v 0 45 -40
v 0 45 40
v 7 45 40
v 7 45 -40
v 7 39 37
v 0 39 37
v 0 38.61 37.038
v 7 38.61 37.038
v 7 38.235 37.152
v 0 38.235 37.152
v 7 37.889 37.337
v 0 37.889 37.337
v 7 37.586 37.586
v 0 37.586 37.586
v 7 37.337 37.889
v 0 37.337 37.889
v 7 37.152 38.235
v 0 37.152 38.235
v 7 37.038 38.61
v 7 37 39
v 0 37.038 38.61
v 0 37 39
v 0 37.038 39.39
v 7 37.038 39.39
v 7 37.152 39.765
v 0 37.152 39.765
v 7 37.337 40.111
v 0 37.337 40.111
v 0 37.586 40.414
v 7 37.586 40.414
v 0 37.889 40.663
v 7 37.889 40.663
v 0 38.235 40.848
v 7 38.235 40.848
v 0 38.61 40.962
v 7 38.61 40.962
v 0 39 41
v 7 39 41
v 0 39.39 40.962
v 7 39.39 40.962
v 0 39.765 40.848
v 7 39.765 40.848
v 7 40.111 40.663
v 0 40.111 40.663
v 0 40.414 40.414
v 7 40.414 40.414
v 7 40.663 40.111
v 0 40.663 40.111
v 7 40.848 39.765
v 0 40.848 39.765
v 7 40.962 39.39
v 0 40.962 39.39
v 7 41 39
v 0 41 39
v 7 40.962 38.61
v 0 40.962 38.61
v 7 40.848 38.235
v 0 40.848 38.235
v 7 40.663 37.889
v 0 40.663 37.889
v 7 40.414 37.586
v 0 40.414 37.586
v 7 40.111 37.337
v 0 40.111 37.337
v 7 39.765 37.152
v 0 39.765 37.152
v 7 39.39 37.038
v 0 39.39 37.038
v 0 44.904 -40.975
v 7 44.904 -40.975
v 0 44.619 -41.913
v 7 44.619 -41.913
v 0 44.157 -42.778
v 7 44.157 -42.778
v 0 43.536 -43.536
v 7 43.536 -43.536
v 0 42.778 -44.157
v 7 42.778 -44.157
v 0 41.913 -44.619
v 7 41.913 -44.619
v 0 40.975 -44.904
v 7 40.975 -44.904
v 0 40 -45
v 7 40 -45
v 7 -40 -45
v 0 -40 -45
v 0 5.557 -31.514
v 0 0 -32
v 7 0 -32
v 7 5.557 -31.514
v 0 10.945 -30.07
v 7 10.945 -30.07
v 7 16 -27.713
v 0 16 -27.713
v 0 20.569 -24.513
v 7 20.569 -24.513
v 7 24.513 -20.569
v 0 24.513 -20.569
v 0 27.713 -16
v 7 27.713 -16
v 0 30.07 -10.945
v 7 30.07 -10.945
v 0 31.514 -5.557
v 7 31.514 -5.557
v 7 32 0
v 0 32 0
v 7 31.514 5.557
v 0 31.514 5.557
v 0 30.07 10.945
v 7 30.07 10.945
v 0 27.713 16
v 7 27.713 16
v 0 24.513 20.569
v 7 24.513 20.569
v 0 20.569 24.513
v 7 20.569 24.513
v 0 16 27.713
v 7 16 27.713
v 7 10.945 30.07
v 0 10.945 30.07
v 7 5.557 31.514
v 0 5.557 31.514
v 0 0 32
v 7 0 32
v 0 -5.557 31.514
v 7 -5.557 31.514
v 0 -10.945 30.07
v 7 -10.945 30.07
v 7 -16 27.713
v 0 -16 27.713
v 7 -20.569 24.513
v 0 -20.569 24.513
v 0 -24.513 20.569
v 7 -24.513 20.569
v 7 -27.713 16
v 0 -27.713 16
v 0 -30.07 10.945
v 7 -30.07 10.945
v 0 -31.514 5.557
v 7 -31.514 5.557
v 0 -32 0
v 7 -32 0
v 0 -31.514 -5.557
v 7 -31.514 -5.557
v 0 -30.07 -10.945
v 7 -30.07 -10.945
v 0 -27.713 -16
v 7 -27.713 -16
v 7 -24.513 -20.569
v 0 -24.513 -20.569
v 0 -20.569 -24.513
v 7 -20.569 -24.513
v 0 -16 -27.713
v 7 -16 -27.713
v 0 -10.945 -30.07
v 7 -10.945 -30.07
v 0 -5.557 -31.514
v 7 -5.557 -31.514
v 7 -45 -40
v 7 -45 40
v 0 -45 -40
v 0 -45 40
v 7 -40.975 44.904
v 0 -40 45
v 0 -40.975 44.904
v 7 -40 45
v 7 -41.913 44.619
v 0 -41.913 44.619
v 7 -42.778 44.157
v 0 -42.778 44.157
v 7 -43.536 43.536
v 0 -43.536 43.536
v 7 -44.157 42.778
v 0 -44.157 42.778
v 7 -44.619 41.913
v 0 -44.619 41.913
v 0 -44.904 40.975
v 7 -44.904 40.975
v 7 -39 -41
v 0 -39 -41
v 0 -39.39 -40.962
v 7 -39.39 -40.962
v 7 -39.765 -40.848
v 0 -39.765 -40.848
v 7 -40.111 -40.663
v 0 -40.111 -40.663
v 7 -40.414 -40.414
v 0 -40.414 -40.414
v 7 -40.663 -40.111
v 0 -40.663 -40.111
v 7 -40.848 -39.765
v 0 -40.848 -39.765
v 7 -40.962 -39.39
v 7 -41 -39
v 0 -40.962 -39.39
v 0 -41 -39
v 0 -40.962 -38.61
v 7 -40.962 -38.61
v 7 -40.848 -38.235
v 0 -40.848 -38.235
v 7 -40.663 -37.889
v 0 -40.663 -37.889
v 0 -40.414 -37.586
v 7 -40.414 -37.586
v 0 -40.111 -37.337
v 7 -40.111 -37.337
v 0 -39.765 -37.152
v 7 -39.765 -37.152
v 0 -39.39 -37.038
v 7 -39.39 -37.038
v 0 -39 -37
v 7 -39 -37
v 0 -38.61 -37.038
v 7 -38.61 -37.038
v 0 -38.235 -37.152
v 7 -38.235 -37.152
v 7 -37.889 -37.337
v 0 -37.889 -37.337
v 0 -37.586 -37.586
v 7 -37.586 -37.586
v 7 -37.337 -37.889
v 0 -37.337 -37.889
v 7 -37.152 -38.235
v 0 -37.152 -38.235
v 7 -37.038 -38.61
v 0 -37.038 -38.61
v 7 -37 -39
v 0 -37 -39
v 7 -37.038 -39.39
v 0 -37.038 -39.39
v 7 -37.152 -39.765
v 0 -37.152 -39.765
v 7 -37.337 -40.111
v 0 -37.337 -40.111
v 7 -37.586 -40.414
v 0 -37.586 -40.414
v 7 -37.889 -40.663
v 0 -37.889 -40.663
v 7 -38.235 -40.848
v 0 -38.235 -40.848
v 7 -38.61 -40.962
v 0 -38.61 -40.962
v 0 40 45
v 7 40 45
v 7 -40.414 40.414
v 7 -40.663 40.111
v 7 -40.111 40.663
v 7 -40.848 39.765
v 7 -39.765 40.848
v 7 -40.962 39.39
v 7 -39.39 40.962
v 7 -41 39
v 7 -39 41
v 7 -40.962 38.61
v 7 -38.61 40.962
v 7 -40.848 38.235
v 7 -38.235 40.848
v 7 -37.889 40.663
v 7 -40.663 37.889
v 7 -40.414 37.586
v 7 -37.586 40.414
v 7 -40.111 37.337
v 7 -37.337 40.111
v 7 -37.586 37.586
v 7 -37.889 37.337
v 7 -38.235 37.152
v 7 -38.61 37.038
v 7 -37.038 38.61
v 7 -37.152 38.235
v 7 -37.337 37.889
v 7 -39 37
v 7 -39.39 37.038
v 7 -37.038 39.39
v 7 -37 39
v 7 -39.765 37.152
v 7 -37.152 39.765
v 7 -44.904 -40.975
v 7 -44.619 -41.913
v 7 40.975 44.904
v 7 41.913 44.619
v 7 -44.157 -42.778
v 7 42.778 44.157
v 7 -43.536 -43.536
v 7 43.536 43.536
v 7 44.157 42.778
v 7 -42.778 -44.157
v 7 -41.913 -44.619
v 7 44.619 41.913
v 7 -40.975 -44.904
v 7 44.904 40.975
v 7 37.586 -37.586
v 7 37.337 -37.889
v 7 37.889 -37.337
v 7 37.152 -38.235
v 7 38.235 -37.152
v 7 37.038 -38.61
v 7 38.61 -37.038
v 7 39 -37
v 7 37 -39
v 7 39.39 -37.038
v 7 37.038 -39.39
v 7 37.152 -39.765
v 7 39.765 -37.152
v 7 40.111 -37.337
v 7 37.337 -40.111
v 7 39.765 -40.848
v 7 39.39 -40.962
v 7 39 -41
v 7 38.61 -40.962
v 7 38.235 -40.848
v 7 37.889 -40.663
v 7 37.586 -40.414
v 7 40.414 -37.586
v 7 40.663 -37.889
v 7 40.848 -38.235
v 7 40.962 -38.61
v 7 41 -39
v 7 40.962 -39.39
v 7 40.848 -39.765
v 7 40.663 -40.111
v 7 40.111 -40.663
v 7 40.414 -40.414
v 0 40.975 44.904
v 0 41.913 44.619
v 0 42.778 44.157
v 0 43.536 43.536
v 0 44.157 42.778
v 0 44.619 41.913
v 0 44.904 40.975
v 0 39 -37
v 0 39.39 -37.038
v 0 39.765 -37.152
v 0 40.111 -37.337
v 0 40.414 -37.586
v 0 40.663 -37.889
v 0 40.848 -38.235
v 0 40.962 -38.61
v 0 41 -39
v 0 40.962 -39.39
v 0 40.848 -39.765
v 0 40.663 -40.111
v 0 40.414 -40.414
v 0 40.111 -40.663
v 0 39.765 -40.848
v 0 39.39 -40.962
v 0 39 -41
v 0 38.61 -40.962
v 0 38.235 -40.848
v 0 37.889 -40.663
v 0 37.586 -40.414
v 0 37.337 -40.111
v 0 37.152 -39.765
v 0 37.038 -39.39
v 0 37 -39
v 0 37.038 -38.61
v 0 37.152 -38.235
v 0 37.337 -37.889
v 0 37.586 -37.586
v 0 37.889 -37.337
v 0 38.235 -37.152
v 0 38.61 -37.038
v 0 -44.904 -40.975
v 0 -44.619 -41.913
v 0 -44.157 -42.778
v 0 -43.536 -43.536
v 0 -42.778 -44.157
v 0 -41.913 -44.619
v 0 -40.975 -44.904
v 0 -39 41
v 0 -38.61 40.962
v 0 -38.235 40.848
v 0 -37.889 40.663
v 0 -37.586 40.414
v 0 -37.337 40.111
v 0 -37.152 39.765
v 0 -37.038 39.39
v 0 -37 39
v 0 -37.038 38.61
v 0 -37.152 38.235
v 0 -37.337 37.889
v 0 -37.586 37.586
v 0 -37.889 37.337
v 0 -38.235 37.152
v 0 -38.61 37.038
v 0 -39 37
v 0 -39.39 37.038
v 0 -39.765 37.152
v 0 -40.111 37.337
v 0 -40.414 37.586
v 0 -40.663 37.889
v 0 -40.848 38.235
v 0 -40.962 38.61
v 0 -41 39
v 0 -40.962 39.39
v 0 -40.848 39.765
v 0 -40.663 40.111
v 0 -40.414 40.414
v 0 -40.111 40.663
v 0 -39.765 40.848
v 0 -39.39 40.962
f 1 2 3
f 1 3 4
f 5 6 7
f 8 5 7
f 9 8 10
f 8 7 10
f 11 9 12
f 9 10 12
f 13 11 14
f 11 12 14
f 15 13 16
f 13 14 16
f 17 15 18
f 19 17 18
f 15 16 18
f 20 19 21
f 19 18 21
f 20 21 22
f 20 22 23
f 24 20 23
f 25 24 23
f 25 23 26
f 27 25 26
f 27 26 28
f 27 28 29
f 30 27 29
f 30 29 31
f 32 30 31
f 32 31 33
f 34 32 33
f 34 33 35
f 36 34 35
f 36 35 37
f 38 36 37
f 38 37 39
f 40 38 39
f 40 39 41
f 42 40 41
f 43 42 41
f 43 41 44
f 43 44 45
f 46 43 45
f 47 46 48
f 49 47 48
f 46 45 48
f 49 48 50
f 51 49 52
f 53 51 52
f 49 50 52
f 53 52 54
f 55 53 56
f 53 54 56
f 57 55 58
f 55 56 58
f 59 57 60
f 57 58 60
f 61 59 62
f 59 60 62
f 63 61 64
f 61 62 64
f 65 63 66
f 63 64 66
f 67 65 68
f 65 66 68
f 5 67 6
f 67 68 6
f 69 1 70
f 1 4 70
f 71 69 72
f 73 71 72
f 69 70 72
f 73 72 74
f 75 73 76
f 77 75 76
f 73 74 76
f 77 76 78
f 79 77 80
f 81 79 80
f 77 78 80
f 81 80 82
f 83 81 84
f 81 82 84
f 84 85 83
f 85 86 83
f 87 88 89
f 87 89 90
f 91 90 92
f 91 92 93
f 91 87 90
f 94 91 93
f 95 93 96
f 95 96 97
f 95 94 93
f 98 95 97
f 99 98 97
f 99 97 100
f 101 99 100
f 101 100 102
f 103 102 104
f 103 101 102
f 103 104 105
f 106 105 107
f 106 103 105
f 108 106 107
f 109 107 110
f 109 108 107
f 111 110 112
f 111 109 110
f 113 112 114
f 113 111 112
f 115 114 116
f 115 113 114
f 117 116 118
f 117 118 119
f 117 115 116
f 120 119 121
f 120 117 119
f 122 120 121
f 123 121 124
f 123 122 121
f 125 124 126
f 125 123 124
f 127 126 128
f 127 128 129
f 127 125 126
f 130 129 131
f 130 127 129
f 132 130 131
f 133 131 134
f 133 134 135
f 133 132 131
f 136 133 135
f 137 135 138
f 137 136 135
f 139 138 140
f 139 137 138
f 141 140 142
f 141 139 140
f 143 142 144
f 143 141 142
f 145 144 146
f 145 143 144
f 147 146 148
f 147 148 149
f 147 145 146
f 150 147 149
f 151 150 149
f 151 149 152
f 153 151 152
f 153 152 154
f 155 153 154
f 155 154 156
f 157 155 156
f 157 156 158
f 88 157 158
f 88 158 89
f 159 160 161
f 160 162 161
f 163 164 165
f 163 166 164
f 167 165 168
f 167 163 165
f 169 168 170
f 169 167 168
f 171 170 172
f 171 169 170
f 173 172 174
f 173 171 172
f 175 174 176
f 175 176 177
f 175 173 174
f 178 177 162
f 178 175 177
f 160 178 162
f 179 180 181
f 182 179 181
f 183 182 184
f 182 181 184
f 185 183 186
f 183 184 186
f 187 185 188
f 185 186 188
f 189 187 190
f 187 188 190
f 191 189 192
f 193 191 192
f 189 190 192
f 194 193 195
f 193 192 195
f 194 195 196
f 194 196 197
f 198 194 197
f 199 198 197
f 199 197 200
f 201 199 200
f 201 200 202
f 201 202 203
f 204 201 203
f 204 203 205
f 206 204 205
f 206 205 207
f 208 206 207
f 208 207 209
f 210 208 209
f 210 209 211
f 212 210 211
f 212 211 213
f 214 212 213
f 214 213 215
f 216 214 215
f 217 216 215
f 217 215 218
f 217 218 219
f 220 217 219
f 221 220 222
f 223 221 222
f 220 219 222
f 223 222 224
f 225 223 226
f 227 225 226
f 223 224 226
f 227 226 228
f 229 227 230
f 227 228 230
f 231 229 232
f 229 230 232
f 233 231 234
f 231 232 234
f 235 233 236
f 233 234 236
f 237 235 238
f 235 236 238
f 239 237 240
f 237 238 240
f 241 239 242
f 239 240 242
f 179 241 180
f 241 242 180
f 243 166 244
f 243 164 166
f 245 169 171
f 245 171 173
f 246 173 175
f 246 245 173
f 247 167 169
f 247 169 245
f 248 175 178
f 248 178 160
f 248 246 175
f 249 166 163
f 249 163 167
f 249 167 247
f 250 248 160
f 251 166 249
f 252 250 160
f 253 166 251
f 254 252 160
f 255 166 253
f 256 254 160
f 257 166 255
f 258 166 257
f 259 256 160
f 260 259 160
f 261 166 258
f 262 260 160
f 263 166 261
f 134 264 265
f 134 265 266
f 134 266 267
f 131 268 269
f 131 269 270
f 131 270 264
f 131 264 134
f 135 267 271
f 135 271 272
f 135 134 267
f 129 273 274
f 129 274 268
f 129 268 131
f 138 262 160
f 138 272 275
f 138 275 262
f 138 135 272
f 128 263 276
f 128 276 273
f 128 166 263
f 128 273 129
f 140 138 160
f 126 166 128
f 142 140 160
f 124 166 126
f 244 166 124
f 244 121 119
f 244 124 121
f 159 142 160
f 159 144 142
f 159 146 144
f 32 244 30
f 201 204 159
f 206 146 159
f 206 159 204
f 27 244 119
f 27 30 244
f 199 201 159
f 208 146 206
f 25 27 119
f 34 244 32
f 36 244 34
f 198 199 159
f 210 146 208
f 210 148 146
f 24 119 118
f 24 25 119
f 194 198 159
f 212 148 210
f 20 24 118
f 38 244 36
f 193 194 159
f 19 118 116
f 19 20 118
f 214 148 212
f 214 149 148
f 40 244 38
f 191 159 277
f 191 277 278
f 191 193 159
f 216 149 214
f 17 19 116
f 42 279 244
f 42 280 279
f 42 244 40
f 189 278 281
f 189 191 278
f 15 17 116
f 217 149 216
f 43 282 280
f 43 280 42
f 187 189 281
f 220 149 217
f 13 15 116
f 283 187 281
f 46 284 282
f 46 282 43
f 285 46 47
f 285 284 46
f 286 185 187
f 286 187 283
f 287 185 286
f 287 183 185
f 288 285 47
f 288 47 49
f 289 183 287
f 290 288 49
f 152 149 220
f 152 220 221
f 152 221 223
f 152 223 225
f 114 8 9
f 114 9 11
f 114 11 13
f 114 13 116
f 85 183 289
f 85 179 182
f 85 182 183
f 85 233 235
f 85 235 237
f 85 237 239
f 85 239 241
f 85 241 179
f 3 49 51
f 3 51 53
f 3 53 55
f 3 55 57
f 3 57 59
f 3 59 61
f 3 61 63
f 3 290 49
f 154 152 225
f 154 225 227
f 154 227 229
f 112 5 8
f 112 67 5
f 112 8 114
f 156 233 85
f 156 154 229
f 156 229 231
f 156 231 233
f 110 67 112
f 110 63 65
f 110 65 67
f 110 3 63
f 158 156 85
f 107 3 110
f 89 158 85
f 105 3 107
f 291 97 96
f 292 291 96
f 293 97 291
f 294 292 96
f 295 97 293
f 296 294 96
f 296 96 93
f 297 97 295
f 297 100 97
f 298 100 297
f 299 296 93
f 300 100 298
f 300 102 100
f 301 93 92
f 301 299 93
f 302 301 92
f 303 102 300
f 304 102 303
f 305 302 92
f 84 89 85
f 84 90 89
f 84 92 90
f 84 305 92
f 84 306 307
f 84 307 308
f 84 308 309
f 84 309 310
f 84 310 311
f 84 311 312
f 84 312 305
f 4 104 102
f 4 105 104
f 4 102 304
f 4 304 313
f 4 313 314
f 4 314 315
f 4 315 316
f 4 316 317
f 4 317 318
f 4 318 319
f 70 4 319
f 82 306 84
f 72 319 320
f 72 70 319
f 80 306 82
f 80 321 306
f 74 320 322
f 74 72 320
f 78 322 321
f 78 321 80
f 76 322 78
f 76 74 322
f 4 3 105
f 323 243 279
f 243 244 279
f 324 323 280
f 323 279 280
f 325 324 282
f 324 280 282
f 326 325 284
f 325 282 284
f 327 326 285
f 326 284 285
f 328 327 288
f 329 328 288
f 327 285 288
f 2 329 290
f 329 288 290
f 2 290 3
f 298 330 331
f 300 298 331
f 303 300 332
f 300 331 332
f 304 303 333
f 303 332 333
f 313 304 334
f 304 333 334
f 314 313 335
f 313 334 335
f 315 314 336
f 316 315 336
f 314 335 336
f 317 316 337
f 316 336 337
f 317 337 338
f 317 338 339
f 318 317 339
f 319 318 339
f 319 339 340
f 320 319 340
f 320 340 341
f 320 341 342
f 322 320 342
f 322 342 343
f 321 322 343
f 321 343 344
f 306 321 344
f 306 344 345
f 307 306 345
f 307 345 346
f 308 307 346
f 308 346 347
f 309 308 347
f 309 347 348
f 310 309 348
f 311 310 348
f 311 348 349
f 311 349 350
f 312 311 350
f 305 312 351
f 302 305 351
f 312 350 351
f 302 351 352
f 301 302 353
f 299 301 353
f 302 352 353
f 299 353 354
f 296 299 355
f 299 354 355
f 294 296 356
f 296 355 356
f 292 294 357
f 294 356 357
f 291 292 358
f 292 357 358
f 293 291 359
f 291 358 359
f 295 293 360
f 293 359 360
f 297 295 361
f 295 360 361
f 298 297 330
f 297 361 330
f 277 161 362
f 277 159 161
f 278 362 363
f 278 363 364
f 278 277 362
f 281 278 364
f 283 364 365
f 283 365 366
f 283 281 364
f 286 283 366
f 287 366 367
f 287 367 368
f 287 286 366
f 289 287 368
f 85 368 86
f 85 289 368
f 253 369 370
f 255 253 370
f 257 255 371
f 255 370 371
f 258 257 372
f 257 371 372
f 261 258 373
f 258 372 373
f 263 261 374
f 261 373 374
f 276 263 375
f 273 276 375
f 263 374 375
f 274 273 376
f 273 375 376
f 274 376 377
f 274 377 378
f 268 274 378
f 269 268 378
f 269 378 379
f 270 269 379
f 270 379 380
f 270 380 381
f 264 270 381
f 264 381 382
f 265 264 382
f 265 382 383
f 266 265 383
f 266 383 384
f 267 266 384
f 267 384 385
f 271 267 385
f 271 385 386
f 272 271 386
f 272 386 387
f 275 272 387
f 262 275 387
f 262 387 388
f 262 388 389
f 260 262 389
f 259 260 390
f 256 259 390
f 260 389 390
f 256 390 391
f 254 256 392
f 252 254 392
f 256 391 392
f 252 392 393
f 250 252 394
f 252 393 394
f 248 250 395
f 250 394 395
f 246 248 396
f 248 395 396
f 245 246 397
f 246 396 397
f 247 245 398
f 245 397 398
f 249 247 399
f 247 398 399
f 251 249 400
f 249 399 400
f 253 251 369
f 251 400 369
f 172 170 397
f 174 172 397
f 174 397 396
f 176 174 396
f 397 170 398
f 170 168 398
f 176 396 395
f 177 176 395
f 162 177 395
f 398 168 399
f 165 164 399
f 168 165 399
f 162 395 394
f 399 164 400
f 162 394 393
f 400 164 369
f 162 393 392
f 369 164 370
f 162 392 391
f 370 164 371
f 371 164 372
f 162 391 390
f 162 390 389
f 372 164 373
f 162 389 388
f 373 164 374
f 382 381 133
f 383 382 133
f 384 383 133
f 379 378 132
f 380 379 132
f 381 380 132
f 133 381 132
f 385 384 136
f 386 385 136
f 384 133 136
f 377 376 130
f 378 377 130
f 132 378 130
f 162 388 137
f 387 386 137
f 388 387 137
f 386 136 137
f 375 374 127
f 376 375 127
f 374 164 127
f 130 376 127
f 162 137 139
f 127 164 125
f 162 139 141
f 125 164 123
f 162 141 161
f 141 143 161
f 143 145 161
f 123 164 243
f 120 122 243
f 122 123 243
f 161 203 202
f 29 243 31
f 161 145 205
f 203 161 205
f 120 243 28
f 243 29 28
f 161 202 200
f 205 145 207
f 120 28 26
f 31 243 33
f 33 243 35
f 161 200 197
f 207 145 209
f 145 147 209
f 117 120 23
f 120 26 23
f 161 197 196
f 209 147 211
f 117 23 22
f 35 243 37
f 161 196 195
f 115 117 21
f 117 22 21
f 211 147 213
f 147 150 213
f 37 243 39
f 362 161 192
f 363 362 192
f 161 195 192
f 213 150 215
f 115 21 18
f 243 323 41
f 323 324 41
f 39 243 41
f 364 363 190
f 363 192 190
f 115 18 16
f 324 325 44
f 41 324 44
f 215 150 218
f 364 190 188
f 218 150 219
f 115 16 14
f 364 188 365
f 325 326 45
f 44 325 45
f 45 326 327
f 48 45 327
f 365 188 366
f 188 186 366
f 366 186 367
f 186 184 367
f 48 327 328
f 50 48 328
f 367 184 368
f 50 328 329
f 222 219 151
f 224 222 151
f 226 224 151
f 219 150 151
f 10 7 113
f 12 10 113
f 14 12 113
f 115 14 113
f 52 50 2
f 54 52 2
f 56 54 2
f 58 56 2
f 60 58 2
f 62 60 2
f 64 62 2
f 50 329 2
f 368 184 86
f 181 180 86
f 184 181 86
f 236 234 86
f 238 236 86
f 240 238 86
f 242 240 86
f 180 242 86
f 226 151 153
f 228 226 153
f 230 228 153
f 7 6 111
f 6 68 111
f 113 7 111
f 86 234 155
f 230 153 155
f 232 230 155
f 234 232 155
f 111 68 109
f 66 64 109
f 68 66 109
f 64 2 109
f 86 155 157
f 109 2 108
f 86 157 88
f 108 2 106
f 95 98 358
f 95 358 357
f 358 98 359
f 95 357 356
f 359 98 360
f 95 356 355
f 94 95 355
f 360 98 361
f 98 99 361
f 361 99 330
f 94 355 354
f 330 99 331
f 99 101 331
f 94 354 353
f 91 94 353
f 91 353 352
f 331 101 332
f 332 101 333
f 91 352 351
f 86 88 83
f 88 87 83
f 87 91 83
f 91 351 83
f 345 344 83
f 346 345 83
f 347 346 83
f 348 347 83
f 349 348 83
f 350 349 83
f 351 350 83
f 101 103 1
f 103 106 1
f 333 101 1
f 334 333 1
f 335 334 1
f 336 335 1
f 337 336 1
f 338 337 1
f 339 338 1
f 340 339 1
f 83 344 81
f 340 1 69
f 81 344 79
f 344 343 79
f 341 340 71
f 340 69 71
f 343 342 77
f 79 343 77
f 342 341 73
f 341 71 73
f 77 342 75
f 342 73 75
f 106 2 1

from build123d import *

# Parameters (mm, degrees)
ESQUISSE1_R             = 45
ESQUISSE1_R_2           = 32
BOSS_EXTRU_1_DEPTH      = 7
ESQUISSE3_R             = 2.5
ESQUISSE3_R_2           = 4
ENL_V_MAT_EXTRU_1_DEPTH = 65.02343321
BOSS_EXTRU_3_START      = -7
ESQUISSE4_W             = 90
ESQUISSE4_H             = 90
ESQUISSE4_R             = 32
BOSS_EXTRU_3_DEPTH      = 7
ESQUISSE5_R             = 2
ENL_V_MAT_EXTRU_2_DEPTH = 65.02343321
CONG_1_R                = 5


with BuildPart() as part:
    # Esquisse1 → Boss.-Extru.1 (new body)
    with BuildSketch(Plane(origin=(0, 0, 0), x_dir=(0, 0, -1), z_dir=(1, 0, 0))):
        Circle(ESQUISSE1_R)
        Circle(ESQUISSE1_R_2, mode=Mode.SUBTRACT)
    extrude(amount=BOSS_EXTRU_1_DEPTH)

    # Esquisse3 → Enlèv. mat.-Extru.1 (cut, through all)
    with BuildSketch(Plane(origin=(7, 0, 0), x_dir=(0, 0, -1), z_dir=(1, 0, 0))):
        with Locations((0, 38)):
            Circle(ESQUISSE3_R)
        with Locations((32.908965344, 19)):
            Circle(ESQUISSE3_R)
        with Locations((32.908965344, -19)):
            Circle(ESQUISSE3_R)
        with Locations((0, -38)):
            Circle(ESQUISSE3_R)
        with Locations((-32.908965344, -19)):
            Circle(ESQUISSE3_R)
        with Locations((-32.908965344, 19)):
            Circle(ESQUISSE3_R)
        with Locations((-20.848699038, 32.366367551)):
            Circle(ESQUISSE3_R_2)
        with Locations((38.454446046, 1.872319227)):
            Circle(ESQUISSE3_R_2)
        with Locations((-17.605747008, -34.238686778)):
            Circle(ESQUISSE3_R_2)
    extrude(amount=-ENL_V_MAT_EXTRU_1_DEPTH, mode=Mode.SUBTRACT)

    # Esquisse4 → Boss.-Extru.3 (add)
    with BuildSketch(Plane(origin=(7, 0, 0), x_dir=(0, 0, -1), z_dir=(1, 0, 0)).offset(BOSS_EXTRU_3_START)):
        Rectangle(ESQUISSE4_W, ESQUISSE4_H)
        Circle(ESQUISSE4_R, mode=Mode.SUBTRACT)
    extrude(amount=BOSS_EXTRU_3_DEPTH)

    # Esquisse5 → Enlèv. mat.-Extru.2 (cut, through all)
    with BuildSketch(Plane.ZY):
        with Locations((-39, 39)):
            Circle(ESQUISSE5_R)
        with Locations(Location((39, 39, 0), (0, 0, 180))):
            Circle(ESQUISSE5_R)
        with Locations((39, -39)):
            Circle(ESQUISSE5_R)
        with Locations(Location((-39, -39, 0), (0, 0, 180))):
            Circle(ESQUISSE5_R)
    extrude(amount=-ENL_V_MAT_EXTRU_2_DEPTH, mode=Mode.SUBTRACT)

    # Congé1
    cong_1_edges = [part.edges().sort_by_distance(p)[0] for p in [
        (3.5, -45, 45),
        (3.5, 45, 45),
        (3.5, -45, -45),
        (3.5, 45, -45),
    ]]
    fillet(cong_1_edges, radius=CONG_1_R)


solid = part.part
